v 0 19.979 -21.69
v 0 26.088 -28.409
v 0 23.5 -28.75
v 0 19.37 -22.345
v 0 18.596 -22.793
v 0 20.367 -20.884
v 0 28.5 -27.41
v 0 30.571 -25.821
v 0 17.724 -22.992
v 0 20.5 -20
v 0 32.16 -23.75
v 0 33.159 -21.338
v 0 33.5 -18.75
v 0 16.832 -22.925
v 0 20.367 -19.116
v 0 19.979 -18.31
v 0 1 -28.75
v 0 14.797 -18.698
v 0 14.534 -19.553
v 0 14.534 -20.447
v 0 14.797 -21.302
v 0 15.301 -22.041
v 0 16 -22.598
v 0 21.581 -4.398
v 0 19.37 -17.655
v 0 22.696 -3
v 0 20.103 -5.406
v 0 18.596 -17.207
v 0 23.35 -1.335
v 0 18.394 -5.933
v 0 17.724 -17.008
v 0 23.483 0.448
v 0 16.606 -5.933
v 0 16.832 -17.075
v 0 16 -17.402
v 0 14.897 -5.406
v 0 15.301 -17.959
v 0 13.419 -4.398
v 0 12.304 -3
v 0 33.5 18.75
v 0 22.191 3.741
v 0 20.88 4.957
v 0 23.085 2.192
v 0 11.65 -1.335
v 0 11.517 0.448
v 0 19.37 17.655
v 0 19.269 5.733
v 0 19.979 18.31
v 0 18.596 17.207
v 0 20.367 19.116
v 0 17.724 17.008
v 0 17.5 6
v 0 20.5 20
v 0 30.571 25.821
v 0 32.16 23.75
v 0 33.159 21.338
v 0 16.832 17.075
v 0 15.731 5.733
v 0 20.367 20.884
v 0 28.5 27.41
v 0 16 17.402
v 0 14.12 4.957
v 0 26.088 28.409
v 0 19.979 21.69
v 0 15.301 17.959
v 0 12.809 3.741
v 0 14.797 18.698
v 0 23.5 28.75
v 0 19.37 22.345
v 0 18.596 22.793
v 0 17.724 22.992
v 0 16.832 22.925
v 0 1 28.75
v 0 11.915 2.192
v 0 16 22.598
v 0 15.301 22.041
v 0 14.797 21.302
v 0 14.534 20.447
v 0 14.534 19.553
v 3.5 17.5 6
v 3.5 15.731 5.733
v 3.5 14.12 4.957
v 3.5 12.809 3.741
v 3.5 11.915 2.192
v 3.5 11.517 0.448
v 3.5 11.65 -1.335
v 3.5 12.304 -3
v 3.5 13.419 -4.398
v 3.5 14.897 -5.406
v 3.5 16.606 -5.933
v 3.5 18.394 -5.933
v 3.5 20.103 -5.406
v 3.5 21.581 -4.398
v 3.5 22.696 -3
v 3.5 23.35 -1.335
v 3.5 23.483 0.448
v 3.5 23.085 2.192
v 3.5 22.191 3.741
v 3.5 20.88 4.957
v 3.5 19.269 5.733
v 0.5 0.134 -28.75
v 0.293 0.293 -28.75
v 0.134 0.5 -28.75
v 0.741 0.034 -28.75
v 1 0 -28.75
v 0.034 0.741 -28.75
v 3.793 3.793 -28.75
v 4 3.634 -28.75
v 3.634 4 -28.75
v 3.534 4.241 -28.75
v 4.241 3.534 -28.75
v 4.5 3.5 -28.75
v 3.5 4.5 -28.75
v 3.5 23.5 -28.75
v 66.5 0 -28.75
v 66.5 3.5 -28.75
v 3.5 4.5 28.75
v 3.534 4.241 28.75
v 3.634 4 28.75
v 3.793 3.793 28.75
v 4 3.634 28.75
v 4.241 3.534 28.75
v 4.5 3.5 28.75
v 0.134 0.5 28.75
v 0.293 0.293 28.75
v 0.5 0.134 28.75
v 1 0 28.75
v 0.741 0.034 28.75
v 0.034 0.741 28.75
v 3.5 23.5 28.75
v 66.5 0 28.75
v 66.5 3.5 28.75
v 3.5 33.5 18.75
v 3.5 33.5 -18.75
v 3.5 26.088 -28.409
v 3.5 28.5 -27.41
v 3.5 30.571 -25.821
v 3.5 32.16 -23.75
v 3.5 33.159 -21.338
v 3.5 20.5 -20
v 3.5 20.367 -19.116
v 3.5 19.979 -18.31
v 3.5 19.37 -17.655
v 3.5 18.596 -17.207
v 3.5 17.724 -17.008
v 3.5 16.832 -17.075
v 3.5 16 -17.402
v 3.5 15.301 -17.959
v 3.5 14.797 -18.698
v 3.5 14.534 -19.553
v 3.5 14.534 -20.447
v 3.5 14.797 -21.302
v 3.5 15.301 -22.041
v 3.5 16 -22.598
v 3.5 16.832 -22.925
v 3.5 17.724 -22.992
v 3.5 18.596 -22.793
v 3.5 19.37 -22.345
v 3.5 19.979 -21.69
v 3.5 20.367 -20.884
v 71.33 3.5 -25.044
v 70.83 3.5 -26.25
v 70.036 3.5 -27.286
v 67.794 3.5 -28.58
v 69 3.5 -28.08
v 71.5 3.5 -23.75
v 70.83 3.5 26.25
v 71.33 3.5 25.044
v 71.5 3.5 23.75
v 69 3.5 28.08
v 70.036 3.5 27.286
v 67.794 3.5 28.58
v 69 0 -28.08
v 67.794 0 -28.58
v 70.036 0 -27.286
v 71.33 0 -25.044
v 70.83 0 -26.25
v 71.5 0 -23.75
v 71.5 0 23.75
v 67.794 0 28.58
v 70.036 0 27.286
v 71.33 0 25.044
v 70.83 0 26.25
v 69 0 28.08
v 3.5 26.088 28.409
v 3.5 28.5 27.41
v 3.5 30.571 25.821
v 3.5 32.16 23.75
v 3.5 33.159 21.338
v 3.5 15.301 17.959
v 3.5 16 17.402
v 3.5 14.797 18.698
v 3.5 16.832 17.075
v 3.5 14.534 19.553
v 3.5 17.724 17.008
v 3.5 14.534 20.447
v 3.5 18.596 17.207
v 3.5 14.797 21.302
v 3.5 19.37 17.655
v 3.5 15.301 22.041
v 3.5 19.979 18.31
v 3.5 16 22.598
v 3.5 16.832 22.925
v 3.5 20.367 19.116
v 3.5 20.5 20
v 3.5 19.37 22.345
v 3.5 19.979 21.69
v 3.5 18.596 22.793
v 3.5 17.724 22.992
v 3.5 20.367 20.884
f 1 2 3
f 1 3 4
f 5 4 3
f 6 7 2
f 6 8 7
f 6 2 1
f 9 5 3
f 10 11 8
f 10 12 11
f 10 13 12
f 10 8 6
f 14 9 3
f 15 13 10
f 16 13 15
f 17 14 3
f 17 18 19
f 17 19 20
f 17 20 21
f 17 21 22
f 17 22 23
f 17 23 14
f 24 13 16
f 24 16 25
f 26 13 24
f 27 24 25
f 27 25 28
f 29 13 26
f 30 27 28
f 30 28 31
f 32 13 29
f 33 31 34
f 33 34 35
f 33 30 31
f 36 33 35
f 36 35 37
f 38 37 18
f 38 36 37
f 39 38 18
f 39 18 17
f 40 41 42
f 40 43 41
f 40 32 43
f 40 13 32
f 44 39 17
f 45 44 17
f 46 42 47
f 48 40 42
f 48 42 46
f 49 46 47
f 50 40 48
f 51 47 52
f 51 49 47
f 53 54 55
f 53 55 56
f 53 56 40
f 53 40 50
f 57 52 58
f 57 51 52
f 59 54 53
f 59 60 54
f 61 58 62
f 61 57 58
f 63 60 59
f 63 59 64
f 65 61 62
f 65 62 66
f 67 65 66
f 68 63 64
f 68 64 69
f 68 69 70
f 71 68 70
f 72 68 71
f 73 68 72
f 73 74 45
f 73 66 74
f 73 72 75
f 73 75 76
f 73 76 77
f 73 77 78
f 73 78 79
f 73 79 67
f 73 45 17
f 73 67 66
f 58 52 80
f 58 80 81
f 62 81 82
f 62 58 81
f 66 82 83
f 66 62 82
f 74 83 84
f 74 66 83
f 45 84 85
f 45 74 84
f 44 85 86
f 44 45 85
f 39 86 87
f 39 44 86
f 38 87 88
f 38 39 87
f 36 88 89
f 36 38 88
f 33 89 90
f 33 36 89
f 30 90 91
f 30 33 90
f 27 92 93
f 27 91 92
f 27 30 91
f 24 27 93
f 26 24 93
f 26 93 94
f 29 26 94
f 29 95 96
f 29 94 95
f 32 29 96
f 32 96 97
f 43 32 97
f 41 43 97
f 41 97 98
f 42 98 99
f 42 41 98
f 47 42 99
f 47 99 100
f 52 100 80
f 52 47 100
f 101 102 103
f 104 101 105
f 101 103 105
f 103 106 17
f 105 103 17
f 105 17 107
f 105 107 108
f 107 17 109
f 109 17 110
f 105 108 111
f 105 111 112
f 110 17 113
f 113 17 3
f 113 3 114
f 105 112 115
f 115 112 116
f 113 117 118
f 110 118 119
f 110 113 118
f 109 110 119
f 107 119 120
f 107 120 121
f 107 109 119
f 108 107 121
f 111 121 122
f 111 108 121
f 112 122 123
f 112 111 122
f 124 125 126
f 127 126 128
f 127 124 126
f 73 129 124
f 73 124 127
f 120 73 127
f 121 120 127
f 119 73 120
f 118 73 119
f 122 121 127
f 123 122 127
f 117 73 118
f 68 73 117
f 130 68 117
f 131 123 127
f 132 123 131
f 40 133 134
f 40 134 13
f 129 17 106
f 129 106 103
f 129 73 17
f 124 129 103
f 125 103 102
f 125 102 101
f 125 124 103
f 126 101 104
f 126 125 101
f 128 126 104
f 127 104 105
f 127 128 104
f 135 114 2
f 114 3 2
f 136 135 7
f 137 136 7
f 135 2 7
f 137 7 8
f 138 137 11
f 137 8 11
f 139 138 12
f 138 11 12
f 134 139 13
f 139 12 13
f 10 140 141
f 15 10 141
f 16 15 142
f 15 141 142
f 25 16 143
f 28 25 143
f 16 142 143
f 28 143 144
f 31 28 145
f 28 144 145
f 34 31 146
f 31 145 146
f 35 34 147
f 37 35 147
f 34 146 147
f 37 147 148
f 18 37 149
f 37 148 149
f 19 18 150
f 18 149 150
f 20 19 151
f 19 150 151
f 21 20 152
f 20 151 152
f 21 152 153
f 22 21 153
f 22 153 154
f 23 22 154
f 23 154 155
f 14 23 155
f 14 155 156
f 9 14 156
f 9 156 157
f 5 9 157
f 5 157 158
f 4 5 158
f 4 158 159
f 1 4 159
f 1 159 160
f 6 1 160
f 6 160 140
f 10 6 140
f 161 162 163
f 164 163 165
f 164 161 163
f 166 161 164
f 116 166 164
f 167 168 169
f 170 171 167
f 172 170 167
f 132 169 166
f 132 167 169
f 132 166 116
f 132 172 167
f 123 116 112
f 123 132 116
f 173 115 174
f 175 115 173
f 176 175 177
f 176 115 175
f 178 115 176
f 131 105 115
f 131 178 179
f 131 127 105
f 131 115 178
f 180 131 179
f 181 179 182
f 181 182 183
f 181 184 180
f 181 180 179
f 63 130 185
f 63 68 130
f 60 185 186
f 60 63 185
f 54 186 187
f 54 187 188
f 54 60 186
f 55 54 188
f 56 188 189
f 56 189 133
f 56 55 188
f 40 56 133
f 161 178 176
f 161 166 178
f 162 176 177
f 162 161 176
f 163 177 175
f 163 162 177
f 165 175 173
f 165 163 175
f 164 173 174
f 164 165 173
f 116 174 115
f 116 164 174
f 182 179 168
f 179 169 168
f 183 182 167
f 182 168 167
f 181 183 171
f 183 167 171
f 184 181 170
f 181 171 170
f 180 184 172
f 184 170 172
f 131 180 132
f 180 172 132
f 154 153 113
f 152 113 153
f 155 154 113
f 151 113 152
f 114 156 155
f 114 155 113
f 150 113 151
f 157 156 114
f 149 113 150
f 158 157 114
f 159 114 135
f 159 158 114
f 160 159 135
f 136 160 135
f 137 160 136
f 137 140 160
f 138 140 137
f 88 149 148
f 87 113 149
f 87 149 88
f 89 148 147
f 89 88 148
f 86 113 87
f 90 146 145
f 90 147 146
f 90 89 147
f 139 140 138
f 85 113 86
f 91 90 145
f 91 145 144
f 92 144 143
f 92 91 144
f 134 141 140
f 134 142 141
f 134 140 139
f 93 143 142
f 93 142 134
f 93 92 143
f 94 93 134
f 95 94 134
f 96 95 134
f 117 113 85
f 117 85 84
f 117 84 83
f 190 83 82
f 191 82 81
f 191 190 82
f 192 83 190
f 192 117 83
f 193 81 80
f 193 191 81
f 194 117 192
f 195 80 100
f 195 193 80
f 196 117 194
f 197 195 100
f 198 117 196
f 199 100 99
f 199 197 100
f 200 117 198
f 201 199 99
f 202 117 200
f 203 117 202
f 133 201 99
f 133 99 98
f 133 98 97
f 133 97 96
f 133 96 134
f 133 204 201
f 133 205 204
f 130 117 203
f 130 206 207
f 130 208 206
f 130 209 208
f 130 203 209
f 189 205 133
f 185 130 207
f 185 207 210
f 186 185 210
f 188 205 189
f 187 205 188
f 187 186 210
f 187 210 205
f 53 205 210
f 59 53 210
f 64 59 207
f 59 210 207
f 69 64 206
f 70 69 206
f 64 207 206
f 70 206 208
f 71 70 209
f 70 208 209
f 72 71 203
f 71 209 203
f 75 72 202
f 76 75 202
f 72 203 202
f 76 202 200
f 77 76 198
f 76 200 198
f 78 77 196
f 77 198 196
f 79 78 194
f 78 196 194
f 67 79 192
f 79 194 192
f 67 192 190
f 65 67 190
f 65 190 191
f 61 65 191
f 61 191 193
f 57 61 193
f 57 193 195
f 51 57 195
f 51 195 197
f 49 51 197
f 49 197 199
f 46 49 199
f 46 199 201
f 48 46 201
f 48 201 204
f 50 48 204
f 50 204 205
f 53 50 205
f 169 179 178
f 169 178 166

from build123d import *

# Parameters (mm, degrees)
SALIENTE_EXTRUIR1_DEPTH    = 28.75
REDONDEO1_R                = 5
REDONDEO2_R                = 10
REDONDEO3_R                = 1
CORTAR_EXTRUIR1_REACH      = 83.073
CROQUIS2_R                 = 3
CORTAR_EXTRUIR2_DEPTH      = 184.03816325
CORTAR_EXTRUIR2_DEPTH_BACK = 184.03816325
CROQUIS4_R                 = 5.999999992


with BuildPart() as part:
    # Croquis1 → Saliente-Extruir1 (new, symmetric)
    with BuildSketch(Plane.XY):
        Polygon((0, 33.5), (0, 0), (71.5, 0), (71.5, 3.5), (3.5, 3.5), (3.5, 33.5), align=None)
    extrude(amount=SALIENTE_EXTRUIR1_DEPTH, both=True)

    # Redondeo1
    redondeo1_edges = [part.edges().sort_by_distance(p)[0] for p in [
        (71.5, 1.75, -28.75),
        (71.5, 1.75, 28.75),
    ]]
    fillet(redondeo1_edges, radius=REDONDEO1_R)

    # Redondeo2
    redondeo2_edges = [part.edges().sort_by_distance(p)[0] for p in [
        (1.75, 33.5, 28.75),
        (1.75, 33.5, -28.75),
    ]]
    fillet(redondeo2_edges, radius=REDONDEO2_R)

    # Redondeo3
    redondeo3_edges = [part.edges().sort_by_distance(p)[0] for p in [
        (0, 0, 0),
        (3.5, 3.5, 0),
    ]]
    fillet(redondeo3_edges, radius=REDONDEO3_R)

    # Croquis2 → Cortar-Extruir1 (cut, up to next)
    with BuildSketch(Plane(origin=(3.5, 0, 0), x_dir=(0, 0, -1), z_dir=(1, 0, 0)), mode=Mode.PRIVATE) as cortar_extruir1_sk1:
        with Locations(Location((0, 17.5, 0), (0, 0, 90))):
            Circle(CROQUIS2_R)
    cortar_extruir1_tool1 = extrude(cortar_extruir1_sk1.sketch, amount=-CORTAR_EXTRUIR1_REACH, mode=Mode.PRIVATE) & part.part
    # Croquis2 → Cortar-Extruir1 (cut, up to next)
    with BuildSketch(Plane(origin=(3.5, 0, 0), x_dir=(0, 0, -1), z_dir=(1, 0, 0)), mode=Mode.PRIVATE) as cortar_extruir1_sk2:
        with Locations(Location((20, 17.5, 0), (0, 0, 90))):
            Circle(CROQUIS2_R)
    cortar_extruir1_tool2 = extrude(cortar_extruir1_sk2.sketch, amount=-CORTAR_EXTRUIR1_REACH, mode=Mode.PRIVATE) & part.part
    # Croquis2 → Cortar-Extruir1 (cut, up to next)
    with BuildSketch(Plane(origin=(3.5, 0, 0), x_dir=(0, 0, -1), z_dir=(1, 0, 0)), mode=Mode.PRIVATE) as cortar_extruir1_sk3:
        with Locations(Location((-20, 17.5, 0), (0, 0, 90))):
            Circle(CROQUIS2_R)
    cortar_extruir1_tool3 = extrude(cortar_extruir1_sk3.sketch, amount=-CORTAR_EXTRUIR1_REACH, mode=Mode.PRIVATE) & part.part
    add(cortar_extruir1_tool1.solids().sort_by_distance((3.5, 17.5, 0))[0], mode=Mode.SUBTRACT)
    add(cortar_extruir1_tool2.solids().sort_by_distance((3.5, 17.5, -20))[0], mode=Mode.SUBTRACT)
    add(cortar_extruir1_tool3.solids().sort_by_distance((3.5, 17.5, 20))[0], mode=Mode.SUBTRACT)

    # Croquis4 → Cortar-Extruir2 (cut, two sides: drawn at the far end of the back side and taken through both)
    with BuildSketch(Plane(origin=(-28.4, 19.037282969, -123.435876688), x_dir=(5.237222008265864e-15, 0.866025403784376, -0.5000000000001087), z_dir=(1, 0, 0)).offset(-CORTAR_EXTRUIR2_DEPTH_BACK)):
        with Locations(Location((-63.049264441, 106.129963469, 0), (0, 0, 120))):
            Circle(CROQUIS4_R)
    extrude(amount=CORTAR_EXTRUIR2_DEPTH + CORTAR_EXTRUIR2_DEPTH_BACK, mode=Mode.SUBTRACT)


solid = part.part
